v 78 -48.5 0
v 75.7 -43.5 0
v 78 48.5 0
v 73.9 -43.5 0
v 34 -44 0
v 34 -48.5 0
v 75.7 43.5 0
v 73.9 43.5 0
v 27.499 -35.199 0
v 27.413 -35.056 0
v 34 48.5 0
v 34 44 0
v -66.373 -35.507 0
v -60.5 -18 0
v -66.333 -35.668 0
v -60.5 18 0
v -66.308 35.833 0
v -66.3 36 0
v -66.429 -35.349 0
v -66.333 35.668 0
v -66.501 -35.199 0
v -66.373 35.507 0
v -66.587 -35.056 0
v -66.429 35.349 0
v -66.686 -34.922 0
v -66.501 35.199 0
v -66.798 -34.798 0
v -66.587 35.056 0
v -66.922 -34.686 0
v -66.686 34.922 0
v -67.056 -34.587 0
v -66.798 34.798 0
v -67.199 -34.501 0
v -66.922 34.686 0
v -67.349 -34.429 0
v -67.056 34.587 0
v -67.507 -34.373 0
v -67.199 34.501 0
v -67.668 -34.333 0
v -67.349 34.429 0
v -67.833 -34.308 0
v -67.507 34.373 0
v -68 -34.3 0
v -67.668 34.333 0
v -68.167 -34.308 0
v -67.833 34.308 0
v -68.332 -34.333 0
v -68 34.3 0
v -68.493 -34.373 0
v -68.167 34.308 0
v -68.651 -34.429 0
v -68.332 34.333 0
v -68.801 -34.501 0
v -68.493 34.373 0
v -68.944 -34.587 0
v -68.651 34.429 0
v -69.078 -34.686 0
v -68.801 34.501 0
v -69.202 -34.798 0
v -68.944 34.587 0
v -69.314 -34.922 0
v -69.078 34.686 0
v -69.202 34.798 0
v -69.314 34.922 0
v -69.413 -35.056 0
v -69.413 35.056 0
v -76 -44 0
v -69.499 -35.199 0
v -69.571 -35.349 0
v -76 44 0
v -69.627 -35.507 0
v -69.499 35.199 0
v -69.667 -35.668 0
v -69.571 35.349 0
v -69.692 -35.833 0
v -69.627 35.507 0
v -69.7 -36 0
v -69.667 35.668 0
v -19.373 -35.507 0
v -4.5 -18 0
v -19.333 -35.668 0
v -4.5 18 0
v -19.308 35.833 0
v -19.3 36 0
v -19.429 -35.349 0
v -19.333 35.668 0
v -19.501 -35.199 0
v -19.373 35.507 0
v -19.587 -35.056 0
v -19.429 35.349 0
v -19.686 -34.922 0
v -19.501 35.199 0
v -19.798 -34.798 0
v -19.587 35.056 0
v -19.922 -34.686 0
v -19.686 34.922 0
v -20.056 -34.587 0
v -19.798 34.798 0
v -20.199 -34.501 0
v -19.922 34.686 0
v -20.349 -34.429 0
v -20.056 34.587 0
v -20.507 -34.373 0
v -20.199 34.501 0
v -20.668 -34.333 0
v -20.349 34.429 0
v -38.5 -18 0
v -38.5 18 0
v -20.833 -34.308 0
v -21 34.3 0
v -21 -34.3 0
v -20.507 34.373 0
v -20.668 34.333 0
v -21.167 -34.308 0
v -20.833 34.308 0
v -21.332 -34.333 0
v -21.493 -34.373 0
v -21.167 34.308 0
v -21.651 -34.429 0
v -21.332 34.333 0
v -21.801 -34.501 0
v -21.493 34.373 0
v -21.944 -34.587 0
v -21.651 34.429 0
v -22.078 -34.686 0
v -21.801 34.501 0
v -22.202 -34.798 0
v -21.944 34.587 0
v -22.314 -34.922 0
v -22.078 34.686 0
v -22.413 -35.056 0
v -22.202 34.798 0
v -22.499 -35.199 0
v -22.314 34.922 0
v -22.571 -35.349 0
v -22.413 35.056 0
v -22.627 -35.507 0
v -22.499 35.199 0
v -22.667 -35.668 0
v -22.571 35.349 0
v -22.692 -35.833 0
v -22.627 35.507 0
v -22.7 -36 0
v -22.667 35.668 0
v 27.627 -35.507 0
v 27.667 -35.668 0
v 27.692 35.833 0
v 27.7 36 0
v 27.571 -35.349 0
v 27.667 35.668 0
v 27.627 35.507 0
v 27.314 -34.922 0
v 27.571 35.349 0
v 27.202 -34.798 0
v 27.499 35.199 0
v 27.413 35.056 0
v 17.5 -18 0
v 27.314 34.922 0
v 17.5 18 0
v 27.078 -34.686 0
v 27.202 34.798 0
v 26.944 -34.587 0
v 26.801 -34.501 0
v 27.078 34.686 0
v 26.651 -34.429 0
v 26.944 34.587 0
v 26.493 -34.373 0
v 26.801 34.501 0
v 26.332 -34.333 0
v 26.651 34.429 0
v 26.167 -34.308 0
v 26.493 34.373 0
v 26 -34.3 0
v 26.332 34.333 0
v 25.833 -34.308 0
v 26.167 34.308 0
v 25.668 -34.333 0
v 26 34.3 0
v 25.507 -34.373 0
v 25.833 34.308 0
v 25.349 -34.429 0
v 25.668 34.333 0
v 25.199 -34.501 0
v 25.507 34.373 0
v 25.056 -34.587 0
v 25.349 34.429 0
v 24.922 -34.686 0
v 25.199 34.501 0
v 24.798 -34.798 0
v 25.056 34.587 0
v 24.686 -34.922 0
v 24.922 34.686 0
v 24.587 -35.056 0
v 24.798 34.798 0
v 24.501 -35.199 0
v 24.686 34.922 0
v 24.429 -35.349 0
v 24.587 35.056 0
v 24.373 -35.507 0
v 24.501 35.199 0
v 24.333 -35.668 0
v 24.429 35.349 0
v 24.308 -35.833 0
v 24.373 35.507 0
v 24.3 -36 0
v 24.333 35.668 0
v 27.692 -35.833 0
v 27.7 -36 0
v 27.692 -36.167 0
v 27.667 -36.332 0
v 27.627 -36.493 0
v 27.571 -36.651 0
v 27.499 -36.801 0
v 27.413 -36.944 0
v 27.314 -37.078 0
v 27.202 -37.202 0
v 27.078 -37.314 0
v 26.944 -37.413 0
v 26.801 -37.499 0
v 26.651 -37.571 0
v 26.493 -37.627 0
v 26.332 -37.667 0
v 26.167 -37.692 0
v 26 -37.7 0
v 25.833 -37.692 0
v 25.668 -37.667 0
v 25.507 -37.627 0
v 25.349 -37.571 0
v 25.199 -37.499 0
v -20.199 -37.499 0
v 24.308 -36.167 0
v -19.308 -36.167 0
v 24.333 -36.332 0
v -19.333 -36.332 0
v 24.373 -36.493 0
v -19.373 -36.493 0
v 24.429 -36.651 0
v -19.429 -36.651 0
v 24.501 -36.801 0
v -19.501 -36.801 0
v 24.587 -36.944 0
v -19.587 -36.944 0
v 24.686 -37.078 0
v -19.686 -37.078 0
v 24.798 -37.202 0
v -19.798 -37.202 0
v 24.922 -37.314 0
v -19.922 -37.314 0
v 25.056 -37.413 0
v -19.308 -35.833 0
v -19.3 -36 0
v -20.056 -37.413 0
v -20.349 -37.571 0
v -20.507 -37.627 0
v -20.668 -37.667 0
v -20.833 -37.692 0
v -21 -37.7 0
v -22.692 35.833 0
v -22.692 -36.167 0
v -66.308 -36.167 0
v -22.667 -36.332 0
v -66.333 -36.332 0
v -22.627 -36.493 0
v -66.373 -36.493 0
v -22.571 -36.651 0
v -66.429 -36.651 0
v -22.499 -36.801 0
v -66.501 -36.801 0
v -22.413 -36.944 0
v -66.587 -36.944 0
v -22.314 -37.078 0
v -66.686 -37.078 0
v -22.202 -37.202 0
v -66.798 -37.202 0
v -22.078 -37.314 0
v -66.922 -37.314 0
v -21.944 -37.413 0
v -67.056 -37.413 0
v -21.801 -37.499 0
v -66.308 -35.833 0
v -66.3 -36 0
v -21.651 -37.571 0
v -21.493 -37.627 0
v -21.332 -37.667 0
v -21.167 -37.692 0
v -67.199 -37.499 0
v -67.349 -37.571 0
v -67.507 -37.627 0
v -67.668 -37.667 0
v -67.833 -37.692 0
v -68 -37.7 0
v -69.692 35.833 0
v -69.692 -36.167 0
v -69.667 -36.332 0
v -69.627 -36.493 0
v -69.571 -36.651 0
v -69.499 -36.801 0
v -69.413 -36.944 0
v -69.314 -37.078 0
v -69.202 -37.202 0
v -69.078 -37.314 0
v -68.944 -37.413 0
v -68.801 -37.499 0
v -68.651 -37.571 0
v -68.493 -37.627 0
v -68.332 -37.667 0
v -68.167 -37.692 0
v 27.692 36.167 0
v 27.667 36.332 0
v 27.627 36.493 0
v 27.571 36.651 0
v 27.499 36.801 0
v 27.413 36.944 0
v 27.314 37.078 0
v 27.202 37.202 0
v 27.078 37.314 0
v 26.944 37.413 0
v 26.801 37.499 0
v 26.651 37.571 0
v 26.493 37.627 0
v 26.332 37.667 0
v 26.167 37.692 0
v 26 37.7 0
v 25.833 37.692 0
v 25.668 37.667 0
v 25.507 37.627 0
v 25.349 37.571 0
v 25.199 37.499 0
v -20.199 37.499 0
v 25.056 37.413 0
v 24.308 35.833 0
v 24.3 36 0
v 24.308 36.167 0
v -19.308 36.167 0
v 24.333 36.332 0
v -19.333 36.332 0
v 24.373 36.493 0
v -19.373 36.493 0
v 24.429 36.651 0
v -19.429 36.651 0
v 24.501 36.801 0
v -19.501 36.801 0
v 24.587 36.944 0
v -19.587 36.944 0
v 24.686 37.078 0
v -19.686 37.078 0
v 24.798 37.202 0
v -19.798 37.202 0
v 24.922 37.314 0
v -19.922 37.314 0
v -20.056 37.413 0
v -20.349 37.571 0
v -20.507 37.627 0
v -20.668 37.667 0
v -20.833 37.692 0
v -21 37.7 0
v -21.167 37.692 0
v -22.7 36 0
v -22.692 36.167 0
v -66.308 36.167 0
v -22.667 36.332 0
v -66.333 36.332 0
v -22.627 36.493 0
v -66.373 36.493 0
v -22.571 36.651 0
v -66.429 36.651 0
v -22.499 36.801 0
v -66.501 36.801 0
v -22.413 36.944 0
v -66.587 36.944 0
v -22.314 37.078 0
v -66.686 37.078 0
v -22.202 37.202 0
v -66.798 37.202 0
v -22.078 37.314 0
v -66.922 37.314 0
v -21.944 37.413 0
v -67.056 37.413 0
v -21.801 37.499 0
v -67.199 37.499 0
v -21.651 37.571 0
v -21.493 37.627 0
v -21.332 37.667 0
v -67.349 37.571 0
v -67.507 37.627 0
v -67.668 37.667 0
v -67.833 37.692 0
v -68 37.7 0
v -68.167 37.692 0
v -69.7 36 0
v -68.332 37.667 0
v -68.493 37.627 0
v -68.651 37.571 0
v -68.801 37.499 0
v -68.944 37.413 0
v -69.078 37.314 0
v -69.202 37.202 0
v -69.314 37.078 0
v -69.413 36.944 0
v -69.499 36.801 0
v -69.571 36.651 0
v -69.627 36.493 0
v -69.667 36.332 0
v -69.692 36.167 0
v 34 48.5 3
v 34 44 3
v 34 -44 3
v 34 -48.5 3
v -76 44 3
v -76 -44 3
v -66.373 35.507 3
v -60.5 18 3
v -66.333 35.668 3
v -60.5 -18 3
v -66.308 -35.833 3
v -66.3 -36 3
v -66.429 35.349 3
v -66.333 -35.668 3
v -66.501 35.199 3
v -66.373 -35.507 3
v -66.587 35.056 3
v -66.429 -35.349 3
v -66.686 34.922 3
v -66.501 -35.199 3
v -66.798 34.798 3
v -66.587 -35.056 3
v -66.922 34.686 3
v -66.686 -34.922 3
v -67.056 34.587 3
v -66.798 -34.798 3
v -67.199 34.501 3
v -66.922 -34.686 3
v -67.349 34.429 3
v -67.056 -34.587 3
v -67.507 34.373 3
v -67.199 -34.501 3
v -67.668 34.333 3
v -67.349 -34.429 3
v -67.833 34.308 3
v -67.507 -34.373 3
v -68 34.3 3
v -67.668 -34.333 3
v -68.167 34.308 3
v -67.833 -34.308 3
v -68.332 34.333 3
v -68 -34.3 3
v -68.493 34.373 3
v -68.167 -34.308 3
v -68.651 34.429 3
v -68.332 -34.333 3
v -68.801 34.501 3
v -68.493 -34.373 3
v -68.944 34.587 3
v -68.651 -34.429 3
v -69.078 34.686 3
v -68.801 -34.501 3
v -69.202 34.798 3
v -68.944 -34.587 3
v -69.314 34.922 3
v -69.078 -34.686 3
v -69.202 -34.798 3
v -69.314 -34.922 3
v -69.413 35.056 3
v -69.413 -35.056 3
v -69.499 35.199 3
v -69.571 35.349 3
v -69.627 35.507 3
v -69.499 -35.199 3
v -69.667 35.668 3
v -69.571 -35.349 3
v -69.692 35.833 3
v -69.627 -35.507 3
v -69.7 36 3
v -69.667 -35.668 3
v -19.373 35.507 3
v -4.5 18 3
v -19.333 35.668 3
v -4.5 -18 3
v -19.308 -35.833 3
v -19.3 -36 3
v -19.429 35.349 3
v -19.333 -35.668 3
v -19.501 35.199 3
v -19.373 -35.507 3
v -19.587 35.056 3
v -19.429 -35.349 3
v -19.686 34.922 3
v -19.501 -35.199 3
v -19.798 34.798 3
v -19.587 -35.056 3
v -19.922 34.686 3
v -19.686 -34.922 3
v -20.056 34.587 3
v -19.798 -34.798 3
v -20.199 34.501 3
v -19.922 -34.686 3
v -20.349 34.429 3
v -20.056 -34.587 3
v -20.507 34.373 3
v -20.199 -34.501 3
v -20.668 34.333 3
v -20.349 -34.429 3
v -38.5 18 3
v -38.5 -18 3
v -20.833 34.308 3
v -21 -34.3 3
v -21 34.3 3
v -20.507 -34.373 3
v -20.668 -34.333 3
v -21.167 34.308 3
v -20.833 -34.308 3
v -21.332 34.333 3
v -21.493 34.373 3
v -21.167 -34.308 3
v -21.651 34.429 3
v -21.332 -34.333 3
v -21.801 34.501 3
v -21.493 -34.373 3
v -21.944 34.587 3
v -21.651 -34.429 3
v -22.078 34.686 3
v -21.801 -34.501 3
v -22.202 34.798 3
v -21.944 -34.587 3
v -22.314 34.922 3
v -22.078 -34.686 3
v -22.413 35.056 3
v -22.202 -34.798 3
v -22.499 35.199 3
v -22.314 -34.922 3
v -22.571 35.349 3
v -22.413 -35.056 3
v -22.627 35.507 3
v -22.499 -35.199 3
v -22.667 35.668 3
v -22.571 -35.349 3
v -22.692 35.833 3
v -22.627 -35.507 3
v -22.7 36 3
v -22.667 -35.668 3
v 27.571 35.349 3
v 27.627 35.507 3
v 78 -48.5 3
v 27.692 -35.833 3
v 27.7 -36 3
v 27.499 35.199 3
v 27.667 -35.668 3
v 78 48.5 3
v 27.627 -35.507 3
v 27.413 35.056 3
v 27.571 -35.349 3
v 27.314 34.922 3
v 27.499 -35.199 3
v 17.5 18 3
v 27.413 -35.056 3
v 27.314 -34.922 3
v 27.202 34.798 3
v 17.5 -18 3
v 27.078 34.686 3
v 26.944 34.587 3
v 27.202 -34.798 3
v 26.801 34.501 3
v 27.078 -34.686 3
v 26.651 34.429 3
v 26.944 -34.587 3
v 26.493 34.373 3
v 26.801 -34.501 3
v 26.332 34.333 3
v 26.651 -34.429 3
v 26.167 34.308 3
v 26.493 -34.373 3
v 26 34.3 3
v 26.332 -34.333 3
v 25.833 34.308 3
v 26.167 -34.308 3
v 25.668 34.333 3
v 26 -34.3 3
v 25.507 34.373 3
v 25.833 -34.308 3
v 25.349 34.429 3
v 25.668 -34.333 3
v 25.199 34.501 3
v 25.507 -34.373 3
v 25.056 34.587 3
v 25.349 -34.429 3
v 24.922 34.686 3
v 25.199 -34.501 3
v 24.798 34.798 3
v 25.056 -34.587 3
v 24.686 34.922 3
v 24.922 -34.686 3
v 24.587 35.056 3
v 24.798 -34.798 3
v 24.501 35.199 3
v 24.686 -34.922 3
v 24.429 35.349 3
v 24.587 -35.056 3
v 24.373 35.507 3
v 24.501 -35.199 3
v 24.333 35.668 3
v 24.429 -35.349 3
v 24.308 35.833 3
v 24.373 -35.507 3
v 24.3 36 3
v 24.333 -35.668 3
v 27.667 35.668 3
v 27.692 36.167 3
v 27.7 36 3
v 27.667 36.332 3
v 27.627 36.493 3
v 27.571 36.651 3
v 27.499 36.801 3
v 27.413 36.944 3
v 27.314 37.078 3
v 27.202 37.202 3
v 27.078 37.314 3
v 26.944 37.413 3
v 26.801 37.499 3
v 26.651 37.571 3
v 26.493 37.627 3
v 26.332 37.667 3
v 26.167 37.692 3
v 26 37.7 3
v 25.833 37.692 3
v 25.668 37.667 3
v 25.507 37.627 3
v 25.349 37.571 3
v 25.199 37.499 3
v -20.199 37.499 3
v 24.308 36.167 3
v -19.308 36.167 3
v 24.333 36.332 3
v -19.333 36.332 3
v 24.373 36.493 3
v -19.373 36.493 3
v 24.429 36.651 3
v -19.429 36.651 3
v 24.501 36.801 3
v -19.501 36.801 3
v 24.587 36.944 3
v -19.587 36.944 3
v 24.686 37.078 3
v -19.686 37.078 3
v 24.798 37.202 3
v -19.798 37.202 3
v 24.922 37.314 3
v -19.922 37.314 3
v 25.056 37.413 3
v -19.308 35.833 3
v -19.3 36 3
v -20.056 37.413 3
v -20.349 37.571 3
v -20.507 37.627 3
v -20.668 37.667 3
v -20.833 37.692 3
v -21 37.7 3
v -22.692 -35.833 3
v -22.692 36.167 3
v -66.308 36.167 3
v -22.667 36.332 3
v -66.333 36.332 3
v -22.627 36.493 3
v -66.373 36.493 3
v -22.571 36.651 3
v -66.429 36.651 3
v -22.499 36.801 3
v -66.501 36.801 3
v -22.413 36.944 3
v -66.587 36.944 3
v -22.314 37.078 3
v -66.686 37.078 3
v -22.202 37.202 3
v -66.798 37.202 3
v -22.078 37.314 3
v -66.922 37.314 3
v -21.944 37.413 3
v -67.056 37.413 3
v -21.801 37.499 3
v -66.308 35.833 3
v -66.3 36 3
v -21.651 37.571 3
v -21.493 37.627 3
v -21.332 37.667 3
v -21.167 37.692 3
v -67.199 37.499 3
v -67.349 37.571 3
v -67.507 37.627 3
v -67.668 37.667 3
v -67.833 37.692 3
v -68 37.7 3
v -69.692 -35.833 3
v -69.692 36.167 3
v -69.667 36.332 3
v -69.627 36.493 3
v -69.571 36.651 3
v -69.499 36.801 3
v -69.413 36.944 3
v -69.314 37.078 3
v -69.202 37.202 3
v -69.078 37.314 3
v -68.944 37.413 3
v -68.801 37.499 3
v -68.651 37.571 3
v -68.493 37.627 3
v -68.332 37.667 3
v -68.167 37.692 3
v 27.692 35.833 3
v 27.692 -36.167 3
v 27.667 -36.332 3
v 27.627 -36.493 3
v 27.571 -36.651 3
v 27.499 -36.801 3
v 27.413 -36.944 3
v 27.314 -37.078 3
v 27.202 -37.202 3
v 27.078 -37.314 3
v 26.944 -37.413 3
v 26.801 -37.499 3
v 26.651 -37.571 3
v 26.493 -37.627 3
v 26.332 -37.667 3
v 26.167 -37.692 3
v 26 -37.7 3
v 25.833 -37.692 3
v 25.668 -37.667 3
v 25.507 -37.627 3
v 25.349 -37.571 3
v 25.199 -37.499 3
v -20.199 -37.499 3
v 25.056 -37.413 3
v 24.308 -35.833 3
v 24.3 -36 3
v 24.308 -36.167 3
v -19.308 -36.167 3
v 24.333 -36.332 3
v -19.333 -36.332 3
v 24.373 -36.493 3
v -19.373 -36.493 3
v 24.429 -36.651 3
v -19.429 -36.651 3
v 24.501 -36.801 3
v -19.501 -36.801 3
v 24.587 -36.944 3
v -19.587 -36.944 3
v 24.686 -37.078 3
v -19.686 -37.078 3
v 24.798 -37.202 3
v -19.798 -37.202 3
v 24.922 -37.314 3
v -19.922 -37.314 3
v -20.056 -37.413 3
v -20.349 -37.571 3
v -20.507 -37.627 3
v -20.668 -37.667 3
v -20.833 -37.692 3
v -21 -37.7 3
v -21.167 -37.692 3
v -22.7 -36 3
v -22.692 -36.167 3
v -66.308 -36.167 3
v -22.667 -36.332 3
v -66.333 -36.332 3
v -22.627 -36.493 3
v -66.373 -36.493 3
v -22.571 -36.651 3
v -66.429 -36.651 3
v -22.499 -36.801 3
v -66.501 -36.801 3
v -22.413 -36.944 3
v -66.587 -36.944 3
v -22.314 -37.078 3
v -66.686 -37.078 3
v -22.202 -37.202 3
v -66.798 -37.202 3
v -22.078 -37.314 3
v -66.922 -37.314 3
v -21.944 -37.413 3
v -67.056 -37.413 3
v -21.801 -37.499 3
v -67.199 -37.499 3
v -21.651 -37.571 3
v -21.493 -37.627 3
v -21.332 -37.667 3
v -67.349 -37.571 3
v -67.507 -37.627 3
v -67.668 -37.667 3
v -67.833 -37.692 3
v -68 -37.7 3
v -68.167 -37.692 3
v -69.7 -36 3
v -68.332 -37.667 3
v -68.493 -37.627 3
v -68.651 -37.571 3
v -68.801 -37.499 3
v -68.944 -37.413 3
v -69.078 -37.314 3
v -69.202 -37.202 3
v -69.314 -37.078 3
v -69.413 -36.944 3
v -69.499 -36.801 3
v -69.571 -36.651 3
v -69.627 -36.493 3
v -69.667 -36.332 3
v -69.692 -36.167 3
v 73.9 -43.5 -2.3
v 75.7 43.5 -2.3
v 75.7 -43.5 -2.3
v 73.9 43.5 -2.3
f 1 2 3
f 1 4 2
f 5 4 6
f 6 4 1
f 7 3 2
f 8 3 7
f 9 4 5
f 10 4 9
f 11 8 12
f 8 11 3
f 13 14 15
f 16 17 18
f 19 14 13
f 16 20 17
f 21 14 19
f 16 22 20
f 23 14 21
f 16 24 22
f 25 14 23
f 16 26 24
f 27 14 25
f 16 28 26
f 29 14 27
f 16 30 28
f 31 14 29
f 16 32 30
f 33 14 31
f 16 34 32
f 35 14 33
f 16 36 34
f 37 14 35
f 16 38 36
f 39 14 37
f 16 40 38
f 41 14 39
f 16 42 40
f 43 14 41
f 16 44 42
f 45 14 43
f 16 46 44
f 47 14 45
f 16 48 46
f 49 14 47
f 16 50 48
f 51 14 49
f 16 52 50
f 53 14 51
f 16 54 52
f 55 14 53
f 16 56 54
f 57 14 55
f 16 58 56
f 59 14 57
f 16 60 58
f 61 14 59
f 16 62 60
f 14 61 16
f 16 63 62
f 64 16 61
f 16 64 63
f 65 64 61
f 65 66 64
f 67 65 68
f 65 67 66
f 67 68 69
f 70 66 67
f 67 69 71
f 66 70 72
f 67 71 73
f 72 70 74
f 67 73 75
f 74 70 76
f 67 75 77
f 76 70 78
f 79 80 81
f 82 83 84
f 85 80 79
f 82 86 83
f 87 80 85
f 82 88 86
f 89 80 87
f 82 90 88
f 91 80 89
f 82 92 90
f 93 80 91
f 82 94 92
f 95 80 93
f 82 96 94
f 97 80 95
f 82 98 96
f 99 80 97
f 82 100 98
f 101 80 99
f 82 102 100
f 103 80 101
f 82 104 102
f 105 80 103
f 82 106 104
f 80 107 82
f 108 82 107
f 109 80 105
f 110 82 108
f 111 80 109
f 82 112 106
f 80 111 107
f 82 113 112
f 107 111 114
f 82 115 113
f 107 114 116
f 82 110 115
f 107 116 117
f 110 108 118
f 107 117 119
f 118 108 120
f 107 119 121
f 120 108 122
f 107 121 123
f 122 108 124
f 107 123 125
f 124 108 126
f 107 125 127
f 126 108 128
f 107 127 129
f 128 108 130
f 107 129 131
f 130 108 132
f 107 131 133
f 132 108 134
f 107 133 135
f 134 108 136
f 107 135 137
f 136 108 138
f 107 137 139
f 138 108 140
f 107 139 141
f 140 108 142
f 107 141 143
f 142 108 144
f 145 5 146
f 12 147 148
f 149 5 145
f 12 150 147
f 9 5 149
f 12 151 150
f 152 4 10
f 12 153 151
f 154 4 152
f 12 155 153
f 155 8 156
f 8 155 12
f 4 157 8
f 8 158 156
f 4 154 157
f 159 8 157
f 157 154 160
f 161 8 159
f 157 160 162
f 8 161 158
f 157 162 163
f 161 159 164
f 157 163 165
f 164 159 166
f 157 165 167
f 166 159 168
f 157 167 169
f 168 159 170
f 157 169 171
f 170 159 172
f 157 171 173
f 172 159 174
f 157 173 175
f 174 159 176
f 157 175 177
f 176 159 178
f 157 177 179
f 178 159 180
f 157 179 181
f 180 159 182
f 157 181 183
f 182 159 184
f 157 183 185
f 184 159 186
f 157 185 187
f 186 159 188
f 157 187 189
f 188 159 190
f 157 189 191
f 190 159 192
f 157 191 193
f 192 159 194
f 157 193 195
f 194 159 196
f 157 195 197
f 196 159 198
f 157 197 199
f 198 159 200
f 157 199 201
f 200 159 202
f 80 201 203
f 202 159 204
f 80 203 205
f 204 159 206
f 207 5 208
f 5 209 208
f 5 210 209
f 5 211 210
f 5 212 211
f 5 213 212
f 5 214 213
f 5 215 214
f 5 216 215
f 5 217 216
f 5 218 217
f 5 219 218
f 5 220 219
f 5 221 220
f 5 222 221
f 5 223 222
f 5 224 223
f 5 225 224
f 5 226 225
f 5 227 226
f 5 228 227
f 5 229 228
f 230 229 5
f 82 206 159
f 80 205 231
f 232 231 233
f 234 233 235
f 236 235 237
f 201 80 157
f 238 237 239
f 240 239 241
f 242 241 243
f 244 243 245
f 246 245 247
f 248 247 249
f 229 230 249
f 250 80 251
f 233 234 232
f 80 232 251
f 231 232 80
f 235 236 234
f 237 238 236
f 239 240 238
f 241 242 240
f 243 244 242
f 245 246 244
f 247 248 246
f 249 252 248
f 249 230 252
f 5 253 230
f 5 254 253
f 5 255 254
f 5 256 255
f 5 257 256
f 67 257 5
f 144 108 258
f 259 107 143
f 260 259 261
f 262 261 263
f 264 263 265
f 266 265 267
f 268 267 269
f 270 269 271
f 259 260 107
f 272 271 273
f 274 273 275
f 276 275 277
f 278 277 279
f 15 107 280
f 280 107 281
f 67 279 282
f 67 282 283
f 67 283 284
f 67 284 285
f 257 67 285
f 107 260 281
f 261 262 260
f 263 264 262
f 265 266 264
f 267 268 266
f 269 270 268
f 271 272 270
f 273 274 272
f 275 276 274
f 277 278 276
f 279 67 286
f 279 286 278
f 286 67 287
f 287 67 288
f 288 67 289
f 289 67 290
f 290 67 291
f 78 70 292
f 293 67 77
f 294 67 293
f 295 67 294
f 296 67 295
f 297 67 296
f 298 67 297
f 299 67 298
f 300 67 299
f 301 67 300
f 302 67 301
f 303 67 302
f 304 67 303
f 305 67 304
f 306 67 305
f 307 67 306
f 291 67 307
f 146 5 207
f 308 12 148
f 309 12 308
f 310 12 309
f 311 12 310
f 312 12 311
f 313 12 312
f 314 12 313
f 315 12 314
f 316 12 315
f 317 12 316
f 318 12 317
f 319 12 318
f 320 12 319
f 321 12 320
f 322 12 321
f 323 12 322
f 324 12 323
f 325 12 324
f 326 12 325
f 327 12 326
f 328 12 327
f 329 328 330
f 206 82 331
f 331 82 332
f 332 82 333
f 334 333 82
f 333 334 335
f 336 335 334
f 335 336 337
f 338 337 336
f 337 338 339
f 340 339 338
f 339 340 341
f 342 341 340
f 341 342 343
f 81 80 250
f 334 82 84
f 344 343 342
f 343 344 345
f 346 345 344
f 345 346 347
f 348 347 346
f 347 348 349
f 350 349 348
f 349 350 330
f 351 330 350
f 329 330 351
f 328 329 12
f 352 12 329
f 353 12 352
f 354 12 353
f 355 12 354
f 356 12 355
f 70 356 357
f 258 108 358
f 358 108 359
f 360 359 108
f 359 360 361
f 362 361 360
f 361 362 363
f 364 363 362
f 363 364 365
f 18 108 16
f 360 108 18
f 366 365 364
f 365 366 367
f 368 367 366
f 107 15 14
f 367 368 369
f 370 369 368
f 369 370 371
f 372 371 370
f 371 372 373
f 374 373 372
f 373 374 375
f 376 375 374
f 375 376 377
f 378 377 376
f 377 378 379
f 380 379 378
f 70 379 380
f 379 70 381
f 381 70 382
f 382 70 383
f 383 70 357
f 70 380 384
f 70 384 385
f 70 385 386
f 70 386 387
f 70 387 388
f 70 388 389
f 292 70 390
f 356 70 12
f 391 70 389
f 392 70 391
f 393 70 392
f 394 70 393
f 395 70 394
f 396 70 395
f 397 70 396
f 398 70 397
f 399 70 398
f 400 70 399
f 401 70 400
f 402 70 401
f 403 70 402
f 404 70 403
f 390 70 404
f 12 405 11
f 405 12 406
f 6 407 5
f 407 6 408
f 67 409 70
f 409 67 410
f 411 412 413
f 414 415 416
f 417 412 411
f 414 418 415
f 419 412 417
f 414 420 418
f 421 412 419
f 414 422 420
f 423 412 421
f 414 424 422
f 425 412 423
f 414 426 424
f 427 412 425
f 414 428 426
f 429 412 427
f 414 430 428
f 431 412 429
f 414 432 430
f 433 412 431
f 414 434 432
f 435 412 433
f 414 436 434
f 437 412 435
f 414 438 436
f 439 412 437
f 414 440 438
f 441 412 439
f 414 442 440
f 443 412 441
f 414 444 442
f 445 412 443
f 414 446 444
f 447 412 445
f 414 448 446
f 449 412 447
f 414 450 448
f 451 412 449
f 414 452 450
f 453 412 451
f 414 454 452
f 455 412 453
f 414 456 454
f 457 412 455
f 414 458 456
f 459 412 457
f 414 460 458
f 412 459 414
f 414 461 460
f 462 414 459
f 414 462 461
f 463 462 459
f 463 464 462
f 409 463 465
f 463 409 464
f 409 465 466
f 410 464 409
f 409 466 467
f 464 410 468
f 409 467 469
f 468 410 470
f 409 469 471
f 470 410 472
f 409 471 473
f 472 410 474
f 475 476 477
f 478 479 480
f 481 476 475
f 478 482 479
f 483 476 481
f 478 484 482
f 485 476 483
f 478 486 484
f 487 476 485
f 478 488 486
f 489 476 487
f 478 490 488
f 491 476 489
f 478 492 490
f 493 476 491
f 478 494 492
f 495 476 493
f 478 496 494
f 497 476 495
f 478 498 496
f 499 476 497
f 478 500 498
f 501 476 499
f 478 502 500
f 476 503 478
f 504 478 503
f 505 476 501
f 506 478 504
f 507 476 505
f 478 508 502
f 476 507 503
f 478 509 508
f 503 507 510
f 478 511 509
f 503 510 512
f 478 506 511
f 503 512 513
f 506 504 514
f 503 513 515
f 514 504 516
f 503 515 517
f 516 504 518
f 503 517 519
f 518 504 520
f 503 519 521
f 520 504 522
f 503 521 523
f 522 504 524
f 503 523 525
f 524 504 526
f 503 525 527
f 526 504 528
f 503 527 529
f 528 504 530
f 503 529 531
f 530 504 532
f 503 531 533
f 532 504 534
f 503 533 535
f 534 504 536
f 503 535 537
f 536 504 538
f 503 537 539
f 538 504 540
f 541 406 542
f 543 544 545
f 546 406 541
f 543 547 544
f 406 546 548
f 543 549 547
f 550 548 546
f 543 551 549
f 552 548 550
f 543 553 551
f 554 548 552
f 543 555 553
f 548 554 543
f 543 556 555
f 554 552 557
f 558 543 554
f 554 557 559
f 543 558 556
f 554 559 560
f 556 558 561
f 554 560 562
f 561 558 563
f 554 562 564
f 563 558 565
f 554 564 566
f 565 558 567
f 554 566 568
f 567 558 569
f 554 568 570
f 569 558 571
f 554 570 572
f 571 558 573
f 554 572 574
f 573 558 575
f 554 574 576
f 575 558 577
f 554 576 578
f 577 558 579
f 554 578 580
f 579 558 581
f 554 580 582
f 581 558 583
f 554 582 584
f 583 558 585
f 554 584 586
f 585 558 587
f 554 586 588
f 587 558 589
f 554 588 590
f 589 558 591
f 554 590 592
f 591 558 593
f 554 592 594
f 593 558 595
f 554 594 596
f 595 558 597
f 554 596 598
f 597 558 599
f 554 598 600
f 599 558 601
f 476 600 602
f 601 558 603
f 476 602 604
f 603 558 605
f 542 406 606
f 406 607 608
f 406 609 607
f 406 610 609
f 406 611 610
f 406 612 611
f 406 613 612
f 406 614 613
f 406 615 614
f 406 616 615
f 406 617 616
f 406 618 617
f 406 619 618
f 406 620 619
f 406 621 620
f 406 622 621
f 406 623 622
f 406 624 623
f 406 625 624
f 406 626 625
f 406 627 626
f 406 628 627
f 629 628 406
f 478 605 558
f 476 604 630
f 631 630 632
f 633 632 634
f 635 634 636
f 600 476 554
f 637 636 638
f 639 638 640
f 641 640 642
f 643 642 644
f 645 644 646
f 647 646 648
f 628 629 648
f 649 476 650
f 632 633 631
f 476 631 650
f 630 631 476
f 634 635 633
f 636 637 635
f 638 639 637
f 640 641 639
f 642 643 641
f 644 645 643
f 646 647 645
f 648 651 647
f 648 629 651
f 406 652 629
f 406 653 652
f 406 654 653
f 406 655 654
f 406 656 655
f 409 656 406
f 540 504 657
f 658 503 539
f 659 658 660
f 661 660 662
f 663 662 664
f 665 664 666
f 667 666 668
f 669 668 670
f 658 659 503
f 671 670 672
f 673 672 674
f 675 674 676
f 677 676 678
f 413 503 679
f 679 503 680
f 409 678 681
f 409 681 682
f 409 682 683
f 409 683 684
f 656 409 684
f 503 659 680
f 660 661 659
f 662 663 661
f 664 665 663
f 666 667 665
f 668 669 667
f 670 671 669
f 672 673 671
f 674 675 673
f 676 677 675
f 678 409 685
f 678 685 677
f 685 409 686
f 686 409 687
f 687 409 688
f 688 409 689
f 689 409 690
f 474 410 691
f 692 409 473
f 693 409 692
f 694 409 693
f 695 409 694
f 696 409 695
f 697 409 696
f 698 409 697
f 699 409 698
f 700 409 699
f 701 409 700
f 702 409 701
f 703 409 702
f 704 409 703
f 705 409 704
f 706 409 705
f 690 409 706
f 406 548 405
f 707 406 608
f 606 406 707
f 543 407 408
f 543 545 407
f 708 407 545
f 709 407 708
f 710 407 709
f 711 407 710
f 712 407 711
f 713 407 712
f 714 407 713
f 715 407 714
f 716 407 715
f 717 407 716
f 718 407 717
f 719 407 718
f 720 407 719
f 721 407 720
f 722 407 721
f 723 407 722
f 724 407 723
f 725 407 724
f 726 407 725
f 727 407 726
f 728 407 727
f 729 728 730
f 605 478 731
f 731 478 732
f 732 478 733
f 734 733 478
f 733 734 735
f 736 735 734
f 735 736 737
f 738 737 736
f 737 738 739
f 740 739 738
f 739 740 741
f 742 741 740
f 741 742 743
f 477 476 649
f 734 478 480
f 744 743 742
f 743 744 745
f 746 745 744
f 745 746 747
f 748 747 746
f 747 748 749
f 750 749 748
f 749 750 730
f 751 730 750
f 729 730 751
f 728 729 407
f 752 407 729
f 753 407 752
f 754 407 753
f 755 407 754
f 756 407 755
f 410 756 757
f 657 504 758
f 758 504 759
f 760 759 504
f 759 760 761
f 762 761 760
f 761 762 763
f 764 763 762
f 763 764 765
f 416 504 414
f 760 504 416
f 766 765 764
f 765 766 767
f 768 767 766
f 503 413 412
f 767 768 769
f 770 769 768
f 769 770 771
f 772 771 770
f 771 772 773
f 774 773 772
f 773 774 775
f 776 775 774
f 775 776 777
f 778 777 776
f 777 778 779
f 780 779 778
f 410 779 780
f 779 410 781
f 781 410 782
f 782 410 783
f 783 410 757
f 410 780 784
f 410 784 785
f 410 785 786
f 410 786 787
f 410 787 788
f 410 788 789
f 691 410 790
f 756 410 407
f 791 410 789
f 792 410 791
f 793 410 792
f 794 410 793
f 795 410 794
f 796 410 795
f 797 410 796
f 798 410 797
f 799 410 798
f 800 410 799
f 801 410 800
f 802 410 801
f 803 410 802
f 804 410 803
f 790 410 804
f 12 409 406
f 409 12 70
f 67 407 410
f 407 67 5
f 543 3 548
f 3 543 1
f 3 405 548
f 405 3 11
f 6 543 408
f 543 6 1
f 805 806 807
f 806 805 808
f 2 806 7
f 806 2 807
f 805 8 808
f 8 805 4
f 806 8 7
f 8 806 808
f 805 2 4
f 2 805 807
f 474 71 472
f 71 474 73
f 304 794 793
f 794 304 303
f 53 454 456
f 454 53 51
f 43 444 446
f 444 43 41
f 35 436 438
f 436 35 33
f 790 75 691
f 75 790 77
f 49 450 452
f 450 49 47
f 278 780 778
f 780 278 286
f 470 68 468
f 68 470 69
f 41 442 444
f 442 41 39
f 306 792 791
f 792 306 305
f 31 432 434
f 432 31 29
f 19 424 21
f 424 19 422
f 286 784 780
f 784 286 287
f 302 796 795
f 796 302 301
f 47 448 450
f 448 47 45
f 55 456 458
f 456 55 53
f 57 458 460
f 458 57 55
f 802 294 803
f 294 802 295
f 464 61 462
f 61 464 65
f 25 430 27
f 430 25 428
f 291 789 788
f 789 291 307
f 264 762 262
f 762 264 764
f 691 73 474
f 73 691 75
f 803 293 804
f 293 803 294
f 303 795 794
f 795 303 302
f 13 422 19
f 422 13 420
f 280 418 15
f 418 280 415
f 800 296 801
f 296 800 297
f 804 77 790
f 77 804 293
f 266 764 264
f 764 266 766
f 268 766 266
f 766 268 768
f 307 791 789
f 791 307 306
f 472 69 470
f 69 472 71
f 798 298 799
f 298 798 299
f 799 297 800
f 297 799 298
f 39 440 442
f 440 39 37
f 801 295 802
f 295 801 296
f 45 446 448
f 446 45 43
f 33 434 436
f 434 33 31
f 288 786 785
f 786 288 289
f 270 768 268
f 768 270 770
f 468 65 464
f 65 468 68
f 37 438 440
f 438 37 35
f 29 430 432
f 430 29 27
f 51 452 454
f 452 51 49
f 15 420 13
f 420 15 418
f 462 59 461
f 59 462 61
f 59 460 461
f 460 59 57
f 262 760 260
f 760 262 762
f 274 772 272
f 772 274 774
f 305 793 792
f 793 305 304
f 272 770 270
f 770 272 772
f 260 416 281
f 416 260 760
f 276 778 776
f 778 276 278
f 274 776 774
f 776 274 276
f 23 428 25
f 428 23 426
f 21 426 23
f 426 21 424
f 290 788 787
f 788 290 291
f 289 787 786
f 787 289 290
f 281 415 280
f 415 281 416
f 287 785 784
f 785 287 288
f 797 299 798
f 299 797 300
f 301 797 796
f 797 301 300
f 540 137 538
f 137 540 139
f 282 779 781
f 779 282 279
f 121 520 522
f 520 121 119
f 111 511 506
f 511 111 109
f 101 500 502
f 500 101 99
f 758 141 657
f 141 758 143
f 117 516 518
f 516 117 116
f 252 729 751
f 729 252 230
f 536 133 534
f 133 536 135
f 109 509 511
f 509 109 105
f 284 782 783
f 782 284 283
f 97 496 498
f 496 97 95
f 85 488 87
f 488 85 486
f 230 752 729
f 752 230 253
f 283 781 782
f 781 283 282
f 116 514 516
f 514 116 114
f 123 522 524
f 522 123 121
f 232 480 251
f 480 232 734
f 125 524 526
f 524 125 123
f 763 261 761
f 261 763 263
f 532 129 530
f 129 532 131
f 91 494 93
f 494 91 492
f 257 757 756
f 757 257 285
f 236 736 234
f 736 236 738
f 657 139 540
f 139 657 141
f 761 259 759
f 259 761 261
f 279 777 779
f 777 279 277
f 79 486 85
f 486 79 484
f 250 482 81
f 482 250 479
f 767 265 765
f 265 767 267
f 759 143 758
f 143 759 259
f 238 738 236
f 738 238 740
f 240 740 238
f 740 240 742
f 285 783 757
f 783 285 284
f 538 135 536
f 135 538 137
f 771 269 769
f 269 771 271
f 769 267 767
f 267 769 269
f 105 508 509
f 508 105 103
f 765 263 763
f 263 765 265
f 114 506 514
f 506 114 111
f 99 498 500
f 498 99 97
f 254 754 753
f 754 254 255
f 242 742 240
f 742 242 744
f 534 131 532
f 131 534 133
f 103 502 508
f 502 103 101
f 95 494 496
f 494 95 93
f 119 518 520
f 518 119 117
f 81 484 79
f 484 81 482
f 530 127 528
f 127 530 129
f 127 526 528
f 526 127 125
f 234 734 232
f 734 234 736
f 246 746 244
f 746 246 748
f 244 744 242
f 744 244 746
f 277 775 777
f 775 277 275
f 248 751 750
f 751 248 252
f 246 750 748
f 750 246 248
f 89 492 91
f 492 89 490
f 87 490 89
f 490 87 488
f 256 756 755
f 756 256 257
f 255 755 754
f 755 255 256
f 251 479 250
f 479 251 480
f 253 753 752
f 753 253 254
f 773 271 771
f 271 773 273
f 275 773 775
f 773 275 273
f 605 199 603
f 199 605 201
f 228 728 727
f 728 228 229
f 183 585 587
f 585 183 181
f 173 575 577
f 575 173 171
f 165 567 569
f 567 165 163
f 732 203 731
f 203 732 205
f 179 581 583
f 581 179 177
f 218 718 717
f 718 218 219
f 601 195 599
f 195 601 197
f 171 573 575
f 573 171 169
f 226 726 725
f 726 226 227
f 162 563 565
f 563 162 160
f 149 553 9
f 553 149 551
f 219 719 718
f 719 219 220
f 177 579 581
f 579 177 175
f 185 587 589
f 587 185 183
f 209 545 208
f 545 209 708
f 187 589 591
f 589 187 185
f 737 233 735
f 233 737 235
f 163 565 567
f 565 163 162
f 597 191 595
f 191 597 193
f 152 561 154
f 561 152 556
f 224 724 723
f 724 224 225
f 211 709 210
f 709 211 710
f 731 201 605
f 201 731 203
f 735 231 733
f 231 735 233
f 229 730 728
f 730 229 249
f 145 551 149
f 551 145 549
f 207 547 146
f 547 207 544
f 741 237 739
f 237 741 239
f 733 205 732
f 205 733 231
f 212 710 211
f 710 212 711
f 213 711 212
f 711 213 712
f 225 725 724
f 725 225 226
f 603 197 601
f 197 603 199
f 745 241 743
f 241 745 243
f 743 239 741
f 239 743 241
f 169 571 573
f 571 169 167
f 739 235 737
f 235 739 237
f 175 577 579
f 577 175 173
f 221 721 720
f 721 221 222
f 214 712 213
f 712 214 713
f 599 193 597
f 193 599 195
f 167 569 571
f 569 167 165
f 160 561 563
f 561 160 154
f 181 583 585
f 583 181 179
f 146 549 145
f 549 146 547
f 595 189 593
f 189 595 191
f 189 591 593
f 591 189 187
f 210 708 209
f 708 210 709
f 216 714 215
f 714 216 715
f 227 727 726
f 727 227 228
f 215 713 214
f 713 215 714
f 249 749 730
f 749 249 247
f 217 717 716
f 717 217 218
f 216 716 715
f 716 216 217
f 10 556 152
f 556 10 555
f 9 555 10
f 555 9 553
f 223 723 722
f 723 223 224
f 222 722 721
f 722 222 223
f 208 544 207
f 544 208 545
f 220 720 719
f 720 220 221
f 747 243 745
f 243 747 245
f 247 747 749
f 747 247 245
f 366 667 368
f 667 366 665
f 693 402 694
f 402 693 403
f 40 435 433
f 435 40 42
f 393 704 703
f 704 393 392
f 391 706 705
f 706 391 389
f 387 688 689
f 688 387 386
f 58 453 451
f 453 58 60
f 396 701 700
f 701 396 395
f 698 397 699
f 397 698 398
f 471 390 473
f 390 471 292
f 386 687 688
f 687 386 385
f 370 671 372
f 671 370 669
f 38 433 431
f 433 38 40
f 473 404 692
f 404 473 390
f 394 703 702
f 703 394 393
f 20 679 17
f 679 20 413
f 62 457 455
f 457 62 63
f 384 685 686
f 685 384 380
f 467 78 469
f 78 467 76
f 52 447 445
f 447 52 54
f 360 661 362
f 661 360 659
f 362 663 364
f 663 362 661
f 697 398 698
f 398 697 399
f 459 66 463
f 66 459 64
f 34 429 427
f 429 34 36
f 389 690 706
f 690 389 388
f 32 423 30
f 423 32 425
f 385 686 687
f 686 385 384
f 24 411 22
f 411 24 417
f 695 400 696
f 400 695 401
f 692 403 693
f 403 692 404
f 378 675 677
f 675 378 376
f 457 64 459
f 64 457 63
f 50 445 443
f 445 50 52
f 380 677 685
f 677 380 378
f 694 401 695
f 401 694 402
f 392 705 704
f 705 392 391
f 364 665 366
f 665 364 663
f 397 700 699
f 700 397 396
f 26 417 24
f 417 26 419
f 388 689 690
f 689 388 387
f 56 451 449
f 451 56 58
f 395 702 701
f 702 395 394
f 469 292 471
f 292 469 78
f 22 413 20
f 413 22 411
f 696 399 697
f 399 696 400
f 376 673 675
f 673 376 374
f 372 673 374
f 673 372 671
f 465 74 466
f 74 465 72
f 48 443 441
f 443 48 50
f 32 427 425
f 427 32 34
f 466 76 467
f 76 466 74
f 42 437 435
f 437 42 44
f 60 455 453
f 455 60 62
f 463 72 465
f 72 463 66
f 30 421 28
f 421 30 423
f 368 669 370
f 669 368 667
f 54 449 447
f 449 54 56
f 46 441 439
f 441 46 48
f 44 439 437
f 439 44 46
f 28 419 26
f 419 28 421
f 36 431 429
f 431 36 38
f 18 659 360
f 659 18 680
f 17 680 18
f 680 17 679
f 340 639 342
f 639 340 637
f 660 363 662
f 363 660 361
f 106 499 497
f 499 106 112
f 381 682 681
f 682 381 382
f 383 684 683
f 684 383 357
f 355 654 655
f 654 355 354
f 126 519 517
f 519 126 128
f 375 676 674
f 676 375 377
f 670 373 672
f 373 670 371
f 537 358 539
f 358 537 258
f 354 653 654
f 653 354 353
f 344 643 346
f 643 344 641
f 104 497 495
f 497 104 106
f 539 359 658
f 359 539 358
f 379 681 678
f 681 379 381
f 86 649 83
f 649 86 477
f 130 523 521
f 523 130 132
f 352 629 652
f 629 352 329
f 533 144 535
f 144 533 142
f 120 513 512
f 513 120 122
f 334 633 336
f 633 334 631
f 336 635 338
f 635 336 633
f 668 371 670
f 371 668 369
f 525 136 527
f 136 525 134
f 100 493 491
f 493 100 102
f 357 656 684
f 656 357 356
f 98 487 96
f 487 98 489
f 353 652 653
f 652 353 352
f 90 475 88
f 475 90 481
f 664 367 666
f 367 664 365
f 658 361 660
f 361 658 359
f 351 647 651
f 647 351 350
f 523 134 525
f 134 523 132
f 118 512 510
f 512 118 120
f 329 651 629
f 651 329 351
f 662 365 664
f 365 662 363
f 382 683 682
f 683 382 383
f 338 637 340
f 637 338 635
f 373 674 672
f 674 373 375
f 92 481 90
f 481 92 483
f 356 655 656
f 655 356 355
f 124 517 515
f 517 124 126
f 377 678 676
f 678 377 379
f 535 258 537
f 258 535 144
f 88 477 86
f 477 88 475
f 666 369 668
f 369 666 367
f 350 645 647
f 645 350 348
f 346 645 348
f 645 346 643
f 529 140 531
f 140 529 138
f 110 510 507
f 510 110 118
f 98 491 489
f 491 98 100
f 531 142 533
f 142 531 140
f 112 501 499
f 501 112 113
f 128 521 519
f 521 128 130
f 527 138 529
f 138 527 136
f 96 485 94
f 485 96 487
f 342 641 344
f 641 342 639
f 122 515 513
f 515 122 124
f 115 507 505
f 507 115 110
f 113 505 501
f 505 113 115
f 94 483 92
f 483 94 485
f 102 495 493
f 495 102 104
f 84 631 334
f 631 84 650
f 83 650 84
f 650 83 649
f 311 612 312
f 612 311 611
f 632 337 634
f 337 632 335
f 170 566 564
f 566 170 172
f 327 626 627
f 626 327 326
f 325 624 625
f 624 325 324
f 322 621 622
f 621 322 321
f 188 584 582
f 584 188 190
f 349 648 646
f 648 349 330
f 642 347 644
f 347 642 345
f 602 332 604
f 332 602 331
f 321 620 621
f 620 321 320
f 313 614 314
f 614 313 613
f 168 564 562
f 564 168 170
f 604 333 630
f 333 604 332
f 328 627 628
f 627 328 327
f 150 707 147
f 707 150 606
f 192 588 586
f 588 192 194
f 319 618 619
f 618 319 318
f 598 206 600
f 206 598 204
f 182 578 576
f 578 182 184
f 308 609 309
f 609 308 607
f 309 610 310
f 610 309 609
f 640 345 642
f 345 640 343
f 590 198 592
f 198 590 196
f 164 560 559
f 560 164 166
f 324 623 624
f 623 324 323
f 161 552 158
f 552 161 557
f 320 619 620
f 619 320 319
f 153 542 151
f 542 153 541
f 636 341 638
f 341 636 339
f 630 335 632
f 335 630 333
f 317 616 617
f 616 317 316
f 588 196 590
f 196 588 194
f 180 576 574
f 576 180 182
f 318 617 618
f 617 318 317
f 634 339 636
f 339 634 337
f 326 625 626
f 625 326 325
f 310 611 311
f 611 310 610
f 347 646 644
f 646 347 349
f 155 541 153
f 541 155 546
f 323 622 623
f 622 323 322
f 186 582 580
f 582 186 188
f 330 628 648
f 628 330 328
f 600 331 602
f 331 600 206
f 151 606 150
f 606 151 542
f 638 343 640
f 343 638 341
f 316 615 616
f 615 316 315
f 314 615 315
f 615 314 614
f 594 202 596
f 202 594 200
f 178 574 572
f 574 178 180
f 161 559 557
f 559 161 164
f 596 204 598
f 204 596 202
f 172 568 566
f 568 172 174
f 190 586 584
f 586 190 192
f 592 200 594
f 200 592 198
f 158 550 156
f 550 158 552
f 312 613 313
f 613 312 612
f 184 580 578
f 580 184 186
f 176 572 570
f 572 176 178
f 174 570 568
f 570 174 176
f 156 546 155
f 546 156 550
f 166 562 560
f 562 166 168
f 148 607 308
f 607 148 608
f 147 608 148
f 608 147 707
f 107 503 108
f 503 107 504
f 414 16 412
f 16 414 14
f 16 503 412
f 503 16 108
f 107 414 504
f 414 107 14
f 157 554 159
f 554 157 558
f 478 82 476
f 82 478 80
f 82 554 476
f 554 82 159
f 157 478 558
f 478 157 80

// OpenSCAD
// Standalone X- service door for the upper body B piece.
// Edit shared dimensions in frame_v4.scad so the assembly and this part stay linked.
// Prints flat as placed. (*) cut USB / power-switch openings after
// measuring the real OpenCR position behind the door.

part_mode = "upper_body_door";
print_export = true;      // use high quality $fn for STL export

include <frame_v4.scad>
